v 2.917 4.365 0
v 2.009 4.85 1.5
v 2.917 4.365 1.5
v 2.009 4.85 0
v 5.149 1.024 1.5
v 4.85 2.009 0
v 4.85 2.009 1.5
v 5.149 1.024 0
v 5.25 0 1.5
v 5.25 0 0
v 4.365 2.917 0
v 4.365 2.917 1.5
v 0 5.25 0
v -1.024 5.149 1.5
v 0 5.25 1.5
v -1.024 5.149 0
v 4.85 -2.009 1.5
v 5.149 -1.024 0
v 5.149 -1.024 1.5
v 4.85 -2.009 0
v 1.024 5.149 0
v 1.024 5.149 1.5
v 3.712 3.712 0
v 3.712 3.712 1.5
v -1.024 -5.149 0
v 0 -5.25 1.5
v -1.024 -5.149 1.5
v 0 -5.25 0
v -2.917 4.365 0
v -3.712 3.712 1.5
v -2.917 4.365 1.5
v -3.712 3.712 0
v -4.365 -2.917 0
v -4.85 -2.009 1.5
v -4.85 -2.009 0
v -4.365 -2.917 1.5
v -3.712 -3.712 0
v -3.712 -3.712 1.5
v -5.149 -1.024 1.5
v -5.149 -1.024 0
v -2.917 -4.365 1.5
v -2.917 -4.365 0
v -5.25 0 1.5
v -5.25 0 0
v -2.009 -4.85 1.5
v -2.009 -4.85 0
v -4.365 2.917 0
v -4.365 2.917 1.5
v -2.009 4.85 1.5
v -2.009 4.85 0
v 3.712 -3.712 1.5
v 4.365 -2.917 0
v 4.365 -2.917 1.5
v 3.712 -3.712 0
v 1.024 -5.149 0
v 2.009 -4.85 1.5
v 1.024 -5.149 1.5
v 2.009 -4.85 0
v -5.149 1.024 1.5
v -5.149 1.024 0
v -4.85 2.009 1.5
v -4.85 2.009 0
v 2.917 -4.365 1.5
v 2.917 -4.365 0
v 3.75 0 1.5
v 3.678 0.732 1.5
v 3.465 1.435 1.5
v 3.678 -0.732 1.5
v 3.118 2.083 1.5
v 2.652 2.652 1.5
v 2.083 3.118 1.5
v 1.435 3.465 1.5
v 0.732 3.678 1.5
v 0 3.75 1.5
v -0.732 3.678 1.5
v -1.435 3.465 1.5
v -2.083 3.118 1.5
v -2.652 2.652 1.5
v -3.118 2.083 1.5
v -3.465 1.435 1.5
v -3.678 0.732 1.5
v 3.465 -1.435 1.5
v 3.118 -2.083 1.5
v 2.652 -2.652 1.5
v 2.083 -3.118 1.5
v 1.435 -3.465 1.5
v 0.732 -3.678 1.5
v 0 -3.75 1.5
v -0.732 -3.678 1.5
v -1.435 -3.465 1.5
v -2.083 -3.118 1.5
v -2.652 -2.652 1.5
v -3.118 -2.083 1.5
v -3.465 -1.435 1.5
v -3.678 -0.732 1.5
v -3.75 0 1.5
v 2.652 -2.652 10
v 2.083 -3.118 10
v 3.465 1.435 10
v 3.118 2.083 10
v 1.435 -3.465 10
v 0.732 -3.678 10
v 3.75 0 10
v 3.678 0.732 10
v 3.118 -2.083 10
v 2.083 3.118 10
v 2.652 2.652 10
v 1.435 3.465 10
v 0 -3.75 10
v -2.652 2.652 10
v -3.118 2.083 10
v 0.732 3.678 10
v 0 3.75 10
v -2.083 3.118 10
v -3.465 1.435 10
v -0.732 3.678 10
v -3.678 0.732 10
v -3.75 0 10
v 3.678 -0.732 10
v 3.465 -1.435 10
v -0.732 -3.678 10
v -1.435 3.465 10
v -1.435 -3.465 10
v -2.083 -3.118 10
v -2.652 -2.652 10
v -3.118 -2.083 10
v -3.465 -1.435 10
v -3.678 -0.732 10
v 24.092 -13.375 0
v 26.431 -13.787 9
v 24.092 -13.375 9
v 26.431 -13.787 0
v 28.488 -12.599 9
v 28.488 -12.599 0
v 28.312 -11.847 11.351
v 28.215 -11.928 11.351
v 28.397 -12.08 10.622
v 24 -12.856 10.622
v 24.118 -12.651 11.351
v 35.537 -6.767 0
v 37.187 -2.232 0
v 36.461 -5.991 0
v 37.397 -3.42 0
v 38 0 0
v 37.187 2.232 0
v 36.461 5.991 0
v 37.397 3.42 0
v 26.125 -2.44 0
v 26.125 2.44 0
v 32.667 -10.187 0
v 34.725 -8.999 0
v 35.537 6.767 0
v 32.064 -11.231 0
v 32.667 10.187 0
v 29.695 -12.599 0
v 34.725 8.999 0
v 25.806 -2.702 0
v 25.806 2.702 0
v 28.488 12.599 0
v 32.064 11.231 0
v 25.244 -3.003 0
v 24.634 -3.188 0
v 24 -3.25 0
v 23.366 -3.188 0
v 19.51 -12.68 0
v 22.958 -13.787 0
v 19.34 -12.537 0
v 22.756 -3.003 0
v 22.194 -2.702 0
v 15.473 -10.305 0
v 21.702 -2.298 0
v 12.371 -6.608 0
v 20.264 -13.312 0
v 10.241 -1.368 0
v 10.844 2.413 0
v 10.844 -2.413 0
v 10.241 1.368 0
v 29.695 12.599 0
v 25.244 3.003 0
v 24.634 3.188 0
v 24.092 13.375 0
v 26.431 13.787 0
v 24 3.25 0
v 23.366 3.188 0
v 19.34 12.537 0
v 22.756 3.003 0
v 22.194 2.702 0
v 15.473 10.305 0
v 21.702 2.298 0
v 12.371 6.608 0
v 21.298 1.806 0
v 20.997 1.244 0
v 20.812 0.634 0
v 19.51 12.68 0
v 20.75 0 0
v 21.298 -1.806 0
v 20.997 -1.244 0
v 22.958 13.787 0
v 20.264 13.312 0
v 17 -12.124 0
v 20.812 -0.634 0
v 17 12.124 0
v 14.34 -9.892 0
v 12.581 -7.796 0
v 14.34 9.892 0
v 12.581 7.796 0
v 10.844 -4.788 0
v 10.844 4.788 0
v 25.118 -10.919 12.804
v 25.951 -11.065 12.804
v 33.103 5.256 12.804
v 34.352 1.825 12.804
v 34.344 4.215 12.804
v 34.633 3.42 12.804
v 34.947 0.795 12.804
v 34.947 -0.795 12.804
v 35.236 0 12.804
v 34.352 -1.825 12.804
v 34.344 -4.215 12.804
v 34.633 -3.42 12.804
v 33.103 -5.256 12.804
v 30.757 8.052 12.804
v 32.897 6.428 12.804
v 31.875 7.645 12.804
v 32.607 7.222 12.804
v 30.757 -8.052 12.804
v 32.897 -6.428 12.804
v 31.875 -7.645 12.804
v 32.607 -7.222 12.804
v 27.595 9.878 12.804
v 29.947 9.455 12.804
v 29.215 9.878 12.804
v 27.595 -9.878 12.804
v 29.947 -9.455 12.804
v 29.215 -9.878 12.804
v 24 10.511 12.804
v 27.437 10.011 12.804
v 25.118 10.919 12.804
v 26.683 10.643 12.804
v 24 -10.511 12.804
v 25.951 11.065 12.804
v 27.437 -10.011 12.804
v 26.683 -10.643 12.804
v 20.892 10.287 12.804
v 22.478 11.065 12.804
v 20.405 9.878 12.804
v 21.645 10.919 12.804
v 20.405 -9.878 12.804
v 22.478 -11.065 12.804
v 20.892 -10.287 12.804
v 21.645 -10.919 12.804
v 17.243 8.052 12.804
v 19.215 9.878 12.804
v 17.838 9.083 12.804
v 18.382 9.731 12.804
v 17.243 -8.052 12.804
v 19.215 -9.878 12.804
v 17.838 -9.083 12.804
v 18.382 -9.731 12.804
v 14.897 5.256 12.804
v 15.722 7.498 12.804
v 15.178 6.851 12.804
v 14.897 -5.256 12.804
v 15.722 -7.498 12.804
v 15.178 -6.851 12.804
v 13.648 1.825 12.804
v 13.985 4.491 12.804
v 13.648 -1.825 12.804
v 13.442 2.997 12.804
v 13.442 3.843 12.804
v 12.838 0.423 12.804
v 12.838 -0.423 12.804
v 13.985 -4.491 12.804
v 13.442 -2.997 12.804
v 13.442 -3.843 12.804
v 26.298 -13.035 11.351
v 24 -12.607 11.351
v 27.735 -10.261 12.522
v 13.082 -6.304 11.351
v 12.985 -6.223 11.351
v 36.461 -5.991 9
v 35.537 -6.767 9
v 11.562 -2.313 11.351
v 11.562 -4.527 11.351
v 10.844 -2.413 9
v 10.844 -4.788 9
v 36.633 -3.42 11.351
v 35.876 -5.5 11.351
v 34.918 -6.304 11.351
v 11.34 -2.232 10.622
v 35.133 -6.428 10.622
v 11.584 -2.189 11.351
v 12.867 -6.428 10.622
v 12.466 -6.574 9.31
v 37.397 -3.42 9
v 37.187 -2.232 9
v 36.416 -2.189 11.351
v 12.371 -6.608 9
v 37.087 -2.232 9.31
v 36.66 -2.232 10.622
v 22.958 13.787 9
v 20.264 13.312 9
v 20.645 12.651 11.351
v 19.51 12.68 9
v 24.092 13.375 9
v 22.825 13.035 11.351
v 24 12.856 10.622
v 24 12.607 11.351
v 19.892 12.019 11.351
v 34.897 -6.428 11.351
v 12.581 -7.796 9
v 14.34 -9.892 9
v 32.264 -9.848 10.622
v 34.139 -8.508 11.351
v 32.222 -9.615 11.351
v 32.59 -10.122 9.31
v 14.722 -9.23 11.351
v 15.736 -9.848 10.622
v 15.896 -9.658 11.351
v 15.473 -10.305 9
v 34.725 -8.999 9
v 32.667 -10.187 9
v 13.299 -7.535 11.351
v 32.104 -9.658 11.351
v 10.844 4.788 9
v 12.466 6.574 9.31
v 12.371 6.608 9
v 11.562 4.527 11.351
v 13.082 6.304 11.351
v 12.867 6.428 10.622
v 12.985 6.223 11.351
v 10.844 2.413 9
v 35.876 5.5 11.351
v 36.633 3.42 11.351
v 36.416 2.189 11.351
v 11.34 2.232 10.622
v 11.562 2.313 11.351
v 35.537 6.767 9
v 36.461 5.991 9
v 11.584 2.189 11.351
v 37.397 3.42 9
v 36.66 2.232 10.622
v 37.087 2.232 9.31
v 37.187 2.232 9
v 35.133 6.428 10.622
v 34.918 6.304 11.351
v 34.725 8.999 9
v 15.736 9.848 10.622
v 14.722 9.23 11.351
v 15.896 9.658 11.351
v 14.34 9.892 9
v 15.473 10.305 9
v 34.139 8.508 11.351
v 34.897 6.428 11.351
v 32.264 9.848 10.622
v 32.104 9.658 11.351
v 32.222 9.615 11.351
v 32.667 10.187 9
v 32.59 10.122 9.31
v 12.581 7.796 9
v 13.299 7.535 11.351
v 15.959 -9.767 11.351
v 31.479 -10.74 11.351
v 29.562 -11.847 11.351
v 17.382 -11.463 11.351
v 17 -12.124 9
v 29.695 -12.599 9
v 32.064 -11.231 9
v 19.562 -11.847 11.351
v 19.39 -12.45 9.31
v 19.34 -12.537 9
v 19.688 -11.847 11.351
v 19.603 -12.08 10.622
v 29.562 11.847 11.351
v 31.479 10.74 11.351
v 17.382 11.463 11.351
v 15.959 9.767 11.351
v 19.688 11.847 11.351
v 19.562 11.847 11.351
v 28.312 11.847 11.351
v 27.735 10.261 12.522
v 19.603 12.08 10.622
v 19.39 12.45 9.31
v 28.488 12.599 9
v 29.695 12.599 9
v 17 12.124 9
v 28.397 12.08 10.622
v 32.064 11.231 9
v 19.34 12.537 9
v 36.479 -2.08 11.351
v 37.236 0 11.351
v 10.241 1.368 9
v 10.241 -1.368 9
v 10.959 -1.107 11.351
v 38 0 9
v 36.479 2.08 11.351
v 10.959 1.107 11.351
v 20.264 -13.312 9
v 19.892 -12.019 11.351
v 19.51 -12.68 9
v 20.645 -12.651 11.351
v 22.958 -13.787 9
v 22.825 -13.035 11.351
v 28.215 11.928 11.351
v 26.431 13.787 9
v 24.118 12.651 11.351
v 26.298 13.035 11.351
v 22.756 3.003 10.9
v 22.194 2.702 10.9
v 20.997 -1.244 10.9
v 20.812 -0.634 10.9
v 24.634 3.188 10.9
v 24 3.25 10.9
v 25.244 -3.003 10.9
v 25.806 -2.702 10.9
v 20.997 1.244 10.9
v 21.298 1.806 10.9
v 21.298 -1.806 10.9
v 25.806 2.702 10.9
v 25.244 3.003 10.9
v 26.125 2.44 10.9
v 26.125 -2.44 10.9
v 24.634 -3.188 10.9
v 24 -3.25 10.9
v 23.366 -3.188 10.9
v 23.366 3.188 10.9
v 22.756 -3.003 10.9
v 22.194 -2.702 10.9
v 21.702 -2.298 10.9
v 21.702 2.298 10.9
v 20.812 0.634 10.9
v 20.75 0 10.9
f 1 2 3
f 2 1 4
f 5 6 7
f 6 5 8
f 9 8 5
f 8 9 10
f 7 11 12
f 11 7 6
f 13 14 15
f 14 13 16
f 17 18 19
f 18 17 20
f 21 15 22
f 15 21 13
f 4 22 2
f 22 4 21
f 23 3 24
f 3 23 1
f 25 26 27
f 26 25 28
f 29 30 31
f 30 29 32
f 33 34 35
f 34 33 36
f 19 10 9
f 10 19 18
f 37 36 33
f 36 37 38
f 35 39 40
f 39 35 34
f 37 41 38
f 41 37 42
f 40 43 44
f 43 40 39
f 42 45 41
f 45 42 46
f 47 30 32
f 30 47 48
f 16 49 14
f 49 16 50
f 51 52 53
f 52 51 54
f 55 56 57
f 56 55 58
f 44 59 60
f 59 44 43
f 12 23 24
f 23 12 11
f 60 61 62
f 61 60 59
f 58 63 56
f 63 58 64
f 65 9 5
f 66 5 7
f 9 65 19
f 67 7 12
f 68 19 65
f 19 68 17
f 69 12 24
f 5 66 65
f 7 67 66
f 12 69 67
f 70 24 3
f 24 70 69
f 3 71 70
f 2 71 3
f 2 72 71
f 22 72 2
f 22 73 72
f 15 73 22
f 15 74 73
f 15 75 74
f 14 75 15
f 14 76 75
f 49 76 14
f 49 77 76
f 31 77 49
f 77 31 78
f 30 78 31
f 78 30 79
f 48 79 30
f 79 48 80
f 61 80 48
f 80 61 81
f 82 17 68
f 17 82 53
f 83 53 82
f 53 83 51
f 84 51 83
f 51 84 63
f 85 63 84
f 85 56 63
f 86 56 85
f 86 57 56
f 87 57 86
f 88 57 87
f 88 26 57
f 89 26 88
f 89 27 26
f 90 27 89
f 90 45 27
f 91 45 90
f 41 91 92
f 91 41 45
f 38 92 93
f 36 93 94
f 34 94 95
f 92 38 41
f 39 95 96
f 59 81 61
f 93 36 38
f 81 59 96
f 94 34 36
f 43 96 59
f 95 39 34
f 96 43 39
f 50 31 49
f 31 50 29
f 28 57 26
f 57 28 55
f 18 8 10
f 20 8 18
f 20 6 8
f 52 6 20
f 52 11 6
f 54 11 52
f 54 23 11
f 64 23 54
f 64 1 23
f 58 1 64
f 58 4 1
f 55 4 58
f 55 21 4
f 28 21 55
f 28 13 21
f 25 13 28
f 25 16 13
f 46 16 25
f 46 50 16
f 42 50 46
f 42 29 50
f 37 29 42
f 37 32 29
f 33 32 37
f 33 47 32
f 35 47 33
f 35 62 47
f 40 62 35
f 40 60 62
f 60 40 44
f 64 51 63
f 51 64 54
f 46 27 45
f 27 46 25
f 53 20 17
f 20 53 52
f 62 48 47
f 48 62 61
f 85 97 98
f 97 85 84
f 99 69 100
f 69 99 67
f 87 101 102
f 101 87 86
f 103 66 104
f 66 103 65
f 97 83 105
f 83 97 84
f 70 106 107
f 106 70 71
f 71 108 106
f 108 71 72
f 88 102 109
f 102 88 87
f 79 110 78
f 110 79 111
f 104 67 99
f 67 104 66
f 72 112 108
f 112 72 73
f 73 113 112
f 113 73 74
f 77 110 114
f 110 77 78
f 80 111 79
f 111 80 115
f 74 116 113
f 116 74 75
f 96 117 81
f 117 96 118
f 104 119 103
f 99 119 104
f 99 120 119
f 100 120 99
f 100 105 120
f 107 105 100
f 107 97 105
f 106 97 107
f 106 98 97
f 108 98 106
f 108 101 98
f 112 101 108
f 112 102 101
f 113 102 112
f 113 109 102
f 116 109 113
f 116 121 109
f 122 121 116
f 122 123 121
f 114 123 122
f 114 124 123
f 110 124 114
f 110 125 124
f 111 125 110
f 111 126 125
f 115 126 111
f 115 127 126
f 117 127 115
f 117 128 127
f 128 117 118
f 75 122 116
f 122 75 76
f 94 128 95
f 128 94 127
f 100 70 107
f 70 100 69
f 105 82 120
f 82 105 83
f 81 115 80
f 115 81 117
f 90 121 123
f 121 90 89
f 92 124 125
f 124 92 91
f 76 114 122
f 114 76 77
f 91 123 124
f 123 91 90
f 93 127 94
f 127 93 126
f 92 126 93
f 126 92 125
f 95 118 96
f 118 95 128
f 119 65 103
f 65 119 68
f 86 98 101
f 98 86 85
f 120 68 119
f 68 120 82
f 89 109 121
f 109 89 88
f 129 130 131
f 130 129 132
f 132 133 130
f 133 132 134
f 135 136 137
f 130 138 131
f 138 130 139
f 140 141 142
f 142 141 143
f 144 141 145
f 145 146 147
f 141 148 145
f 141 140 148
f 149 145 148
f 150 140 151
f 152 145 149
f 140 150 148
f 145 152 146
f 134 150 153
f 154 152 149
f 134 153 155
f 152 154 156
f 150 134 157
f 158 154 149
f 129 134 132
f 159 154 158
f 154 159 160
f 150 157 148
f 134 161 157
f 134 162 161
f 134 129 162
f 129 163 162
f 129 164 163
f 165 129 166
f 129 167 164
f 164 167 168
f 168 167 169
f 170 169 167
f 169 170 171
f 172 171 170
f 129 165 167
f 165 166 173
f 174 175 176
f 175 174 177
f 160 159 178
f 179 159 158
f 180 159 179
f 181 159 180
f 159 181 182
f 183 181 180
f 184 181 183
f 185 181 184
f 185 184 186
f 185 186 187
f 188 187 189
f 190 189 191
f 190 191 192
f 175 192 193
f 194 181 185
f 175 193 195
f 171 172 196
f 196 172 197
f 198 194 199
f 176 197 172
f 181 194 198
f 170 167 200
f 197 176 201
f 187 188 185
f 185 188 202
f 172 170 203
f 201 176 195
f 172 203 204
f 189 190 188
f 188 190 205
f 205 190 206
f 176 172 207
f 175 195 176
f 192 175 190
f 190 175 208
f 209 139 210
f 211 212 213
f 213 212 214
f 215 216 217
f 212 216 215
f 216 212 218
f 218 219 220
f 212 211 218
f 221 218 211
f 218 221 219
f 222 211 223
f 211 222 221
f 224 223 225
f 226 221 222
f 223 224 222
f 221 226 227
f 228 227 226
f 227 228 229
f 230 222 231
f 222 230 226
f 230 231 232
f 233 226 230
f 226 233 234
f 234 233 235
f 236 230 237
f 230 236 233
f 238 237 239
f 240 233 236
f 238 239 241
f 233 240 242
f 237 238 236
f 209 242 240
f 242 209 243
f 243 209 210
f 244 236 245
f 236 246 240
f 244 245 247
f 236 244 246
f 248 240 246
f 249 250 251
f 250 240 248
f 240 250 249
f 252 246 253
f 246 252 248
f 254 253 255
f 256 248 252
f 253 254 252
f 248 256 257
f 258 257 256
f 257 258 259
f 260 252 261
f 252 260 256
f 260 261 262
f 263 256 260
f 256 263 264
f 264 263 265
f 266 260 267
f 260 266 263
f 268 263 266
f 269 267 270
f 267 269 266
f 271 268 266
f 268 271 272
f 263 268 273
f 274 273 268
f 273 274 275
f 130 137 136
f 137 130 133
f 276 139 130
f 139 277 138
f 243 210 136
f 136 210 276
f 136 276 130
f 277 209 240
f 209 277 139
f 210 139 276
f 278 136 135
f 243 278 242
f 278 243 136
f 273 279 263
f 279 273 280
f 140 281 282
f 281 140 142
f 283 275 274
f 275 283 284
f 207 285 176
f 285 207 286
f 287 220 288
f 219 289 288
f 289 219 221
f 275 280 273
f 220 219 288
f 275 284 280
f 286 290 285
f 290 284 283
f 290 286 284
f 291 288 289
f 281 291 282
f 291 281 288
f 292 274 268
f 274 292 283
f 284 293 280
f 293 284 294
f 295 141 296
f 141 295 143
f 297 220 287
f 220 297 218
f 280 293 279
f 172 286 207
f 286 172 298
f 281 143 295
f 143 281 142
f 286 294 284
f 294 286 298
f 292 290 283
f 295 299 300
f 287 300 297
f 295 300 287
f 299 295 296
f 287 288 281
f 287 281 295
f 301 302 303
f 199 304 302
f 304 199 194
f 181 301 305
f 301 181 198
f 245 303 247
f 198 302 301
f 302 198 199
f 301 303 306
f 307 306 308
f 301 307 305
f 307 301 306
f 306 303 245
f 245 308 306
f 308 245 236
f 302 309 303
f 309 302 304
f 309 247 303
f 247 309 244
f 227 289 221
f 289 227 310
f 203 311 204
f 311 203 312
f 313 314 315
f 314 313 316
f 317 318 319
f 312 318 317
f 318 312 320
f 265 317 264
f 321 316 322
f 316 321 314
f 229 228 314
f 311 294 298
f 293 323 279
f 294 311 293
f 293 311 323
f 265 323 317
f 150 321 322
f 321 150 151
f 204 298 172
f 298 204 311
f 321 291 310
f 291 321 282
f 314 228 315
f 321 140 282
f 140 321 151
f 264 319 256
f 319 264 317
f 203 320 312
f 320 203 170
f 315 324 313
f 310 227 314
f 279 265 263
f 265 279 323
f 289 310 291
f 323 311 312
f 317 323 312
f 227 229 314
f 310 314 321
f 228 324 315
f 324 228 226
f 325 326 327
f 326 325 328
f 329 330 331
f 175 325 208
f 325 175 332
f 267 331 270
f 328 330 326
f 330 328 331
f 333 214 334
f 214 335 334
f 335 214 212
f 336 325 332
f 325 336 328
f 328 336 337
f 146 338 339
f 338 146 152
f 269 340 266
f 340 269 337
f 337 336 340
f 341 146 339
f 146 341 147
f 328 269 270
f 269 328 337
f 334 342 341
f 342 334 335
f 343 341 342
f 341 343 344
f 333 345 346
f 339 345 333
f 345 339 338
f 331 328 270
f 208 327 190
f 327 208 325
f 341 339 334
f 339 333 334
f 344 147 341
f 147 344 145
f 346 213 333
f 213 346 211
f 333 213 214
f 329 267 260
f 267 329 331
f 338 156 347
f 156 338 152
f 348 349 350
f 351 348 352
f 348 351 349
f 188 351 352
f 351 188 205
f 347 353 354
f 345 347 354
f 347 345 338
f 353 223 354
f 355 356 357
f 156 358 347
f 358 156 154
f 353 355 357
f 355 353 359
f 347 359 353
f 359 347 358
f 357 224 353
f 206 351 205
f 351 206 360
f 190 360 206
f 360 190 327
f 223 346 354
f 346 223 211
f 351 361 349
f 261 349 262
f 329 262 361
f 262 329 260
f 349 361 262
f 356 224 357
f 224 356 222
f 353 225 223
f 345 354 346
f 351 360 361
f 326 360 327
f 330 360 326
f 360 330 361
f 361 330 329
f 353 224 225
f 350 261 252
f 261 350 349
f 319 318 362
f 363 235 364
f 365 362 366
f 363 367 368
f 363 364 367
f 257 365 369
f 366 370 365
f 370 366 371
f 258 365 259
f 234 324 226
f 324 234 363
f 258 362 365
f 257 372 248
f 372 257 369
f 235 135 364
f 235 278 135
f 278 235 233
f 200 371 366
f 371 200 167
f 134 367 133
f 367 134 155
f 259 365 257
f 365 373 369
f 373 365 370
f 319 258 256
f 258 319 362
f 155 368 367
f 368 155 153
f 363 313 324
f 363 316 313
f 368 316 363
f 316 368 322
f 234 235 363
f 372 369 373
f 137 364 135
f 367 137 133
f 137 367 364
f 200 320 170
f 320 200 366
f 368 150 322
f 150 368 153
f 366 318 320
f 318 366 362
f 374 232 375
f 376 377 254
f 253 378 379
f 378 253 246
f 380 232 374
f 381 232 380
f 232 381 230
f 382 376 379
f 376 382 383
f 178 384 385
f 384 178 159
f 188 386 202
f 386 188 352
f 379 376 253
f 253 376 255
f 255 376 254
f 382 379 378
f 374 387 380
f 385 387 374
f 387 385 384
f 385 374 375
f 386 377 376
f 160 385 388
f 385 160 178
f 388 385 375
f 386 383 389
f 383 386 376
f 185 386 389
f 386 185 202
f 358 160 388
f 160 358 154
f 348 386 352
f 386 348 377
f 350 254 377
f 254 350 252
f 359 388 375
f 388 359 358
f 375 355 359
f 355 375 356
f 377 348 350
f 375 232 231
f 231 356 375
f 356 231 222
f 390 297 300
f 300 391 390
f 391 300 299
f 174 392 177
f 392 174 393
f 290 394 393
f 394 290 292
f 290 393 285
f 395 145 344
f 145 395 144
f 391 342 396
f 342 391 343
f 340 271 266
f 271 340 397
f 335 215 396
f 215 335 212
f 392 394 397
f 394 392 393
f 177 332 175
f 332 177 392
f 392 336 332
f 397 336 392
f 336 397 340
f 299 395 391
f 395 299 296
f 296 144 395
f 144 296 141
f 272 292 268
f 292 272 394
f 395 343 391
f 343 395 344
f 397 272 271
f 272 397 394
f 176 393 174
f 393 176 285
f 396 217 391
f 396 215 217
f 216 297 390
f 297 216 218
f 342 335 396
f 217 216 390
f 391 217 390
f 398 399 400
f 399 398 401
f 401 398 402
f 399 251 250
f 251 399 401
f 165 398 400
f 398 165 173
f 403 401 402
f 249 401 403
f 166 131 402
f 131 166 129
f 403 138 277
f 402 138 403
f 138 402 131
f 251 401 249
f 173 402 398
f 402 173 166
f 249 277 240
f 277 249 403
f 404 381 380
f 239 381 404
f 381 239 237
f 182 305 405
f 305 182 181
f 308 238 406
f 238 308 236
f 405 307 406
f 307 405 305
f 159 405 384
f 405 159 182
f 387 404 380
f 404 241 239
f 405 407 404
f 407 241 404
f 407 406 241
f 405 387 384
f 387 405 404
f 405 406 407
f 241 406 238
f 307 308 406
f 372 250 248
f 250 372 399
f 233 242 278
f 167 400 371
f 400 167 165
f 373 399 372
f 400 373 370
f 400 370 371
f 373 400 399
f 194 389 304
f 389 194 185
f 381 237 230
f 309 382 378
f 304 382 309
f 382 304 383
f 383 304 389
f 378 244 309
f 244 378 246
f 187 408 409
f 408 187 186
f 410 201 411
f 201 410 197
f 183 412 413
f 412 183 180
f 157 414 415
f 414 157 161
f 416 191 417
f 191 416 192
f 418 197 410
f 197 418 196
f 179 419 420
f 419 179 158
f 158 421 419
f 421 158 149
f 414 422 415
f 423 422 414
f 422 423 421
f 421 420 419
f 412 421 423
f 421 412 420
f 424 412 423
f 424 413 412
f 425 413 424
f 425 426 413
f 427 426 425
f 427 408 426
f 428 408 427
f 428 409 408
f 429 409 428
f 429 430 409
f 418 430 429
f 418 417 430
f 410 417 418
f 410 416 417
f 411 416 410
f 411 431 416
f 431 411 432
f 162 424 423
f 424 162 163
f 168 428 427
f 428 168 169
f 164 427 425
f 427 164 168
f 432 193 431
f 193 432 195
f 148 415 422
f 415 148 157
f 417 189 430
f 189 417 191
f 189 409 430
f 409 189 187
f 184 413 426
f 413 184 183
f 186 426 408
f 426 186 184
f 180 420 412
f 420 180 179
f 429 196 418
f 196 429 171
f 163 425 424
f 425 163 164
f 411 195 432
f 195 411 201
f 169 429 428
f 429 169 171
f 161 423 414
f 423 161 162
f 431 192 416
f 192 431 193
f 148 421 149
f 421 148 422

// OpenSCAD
slop = .25;

m3_dia = 3;
m3_rad = m3_dia/2+slop;

m3_cap_dia = 5.7;
m3_cap_rad = m3_cap_dia/2+slop;
m3_cap_thick = 1.65+slop/2;
m3_cap_hex_rad = (2/cos(30))/2;

m3_nut_dia = 6.5;
m3_nut_rad = m3_nut_dia/2+slop;
m3_nut_thick = 2.4;


lm8uu_dia = 15;
lm8uu_rad = lm8uu_dia/2+slop;
lm8uu_len = 24+slop;

lm8uu_inset = 2;  //inset into frame

wall = 3;
height = 8;
switch = 4;
shaft = 6.0+slop;

$fn=32;
//for(i=[0:360/7:350]) rotate([0,0,i]) translate([12,0,0]) 
//	spacer();

stop_button();
translate([24,0,0]) knob();

module knob(){
	thick = 13;
	rad = 14;
	D = 5;
	mrad=4;
	difference(){
		minkowski(){
			union(){
				for(i=[0:20:40]) rotate([0,0,i]) cylinder(r=rad-mrad, h=thick-mrad, $fn=6);
			}
			intersection(){
				sphere(r=mrad, $fn=9);
				translate([0,0,10]) cube([20,20,20],center=true);
			}
		}

		//d shaft
		translate([0,0,-.1]) difference(){
			cylinder(r=(shaft+slop)/2, h=thick-2);
			translate([D+slop,0,0]) cube([shaft, shaft, (thick-2)*2],center=true);
		}
	}
}

module stop_button(){
	dia = 8;
	rad = dia/2-slop;
	base_rad = rad+wall/2;
	union(){
		cylinder(r=base_rad, h=1.5);
		cylinder(r=rad, h=height-switch+6);
	}
}

module spacer(h=8){
	difference(){
		cylinder(r=m3_rad+wall, h=h, $fn=6);
		
		cylinder(r=m3_rad, h=h*2.2, center=true);
	}
}

module cap_screw(len = 10){
	color([.25,.25,.25])
	difference(){
		union(){
			translate([0,0,-len/2]) rotate([0,0,-90]) cap_cylinder(r=screw_rad, h=len, center=true);
			translate([0,0,len/2-.1]) difference(){
				scale([1,1,.75]) sphere(r=cap_rad);
				translate([0,0,-cap_dia/2]) cube([cap_dia+1, cap_dia+1, cap_dia],center=true);
				translate([0,0,cap_dia/2+.1+cap_thick]) cube([cap_dia+1, cap_dia+1, cap_dia],center=true);
			}
		}
		
		translate([0,0,len/2+slop]) cylinder(r=cap_hex_rad, h=cap_thick, $fn=6);
	}
}

module cap_cylinder(r=1, h=1, center=false){
	cylinder(r=r, h=h, center=center);
	intersection(){
		rotate([0,0,22.5]) cylinder(r=r/cos(180/8), h=h, $fn=8, center=center);
		translate([0,-r/cos(180/4),0]) rotate([0,0,0]) cylinder(r=r/cos(180/4), h=h, $fn=4, center=center);
	}
}
